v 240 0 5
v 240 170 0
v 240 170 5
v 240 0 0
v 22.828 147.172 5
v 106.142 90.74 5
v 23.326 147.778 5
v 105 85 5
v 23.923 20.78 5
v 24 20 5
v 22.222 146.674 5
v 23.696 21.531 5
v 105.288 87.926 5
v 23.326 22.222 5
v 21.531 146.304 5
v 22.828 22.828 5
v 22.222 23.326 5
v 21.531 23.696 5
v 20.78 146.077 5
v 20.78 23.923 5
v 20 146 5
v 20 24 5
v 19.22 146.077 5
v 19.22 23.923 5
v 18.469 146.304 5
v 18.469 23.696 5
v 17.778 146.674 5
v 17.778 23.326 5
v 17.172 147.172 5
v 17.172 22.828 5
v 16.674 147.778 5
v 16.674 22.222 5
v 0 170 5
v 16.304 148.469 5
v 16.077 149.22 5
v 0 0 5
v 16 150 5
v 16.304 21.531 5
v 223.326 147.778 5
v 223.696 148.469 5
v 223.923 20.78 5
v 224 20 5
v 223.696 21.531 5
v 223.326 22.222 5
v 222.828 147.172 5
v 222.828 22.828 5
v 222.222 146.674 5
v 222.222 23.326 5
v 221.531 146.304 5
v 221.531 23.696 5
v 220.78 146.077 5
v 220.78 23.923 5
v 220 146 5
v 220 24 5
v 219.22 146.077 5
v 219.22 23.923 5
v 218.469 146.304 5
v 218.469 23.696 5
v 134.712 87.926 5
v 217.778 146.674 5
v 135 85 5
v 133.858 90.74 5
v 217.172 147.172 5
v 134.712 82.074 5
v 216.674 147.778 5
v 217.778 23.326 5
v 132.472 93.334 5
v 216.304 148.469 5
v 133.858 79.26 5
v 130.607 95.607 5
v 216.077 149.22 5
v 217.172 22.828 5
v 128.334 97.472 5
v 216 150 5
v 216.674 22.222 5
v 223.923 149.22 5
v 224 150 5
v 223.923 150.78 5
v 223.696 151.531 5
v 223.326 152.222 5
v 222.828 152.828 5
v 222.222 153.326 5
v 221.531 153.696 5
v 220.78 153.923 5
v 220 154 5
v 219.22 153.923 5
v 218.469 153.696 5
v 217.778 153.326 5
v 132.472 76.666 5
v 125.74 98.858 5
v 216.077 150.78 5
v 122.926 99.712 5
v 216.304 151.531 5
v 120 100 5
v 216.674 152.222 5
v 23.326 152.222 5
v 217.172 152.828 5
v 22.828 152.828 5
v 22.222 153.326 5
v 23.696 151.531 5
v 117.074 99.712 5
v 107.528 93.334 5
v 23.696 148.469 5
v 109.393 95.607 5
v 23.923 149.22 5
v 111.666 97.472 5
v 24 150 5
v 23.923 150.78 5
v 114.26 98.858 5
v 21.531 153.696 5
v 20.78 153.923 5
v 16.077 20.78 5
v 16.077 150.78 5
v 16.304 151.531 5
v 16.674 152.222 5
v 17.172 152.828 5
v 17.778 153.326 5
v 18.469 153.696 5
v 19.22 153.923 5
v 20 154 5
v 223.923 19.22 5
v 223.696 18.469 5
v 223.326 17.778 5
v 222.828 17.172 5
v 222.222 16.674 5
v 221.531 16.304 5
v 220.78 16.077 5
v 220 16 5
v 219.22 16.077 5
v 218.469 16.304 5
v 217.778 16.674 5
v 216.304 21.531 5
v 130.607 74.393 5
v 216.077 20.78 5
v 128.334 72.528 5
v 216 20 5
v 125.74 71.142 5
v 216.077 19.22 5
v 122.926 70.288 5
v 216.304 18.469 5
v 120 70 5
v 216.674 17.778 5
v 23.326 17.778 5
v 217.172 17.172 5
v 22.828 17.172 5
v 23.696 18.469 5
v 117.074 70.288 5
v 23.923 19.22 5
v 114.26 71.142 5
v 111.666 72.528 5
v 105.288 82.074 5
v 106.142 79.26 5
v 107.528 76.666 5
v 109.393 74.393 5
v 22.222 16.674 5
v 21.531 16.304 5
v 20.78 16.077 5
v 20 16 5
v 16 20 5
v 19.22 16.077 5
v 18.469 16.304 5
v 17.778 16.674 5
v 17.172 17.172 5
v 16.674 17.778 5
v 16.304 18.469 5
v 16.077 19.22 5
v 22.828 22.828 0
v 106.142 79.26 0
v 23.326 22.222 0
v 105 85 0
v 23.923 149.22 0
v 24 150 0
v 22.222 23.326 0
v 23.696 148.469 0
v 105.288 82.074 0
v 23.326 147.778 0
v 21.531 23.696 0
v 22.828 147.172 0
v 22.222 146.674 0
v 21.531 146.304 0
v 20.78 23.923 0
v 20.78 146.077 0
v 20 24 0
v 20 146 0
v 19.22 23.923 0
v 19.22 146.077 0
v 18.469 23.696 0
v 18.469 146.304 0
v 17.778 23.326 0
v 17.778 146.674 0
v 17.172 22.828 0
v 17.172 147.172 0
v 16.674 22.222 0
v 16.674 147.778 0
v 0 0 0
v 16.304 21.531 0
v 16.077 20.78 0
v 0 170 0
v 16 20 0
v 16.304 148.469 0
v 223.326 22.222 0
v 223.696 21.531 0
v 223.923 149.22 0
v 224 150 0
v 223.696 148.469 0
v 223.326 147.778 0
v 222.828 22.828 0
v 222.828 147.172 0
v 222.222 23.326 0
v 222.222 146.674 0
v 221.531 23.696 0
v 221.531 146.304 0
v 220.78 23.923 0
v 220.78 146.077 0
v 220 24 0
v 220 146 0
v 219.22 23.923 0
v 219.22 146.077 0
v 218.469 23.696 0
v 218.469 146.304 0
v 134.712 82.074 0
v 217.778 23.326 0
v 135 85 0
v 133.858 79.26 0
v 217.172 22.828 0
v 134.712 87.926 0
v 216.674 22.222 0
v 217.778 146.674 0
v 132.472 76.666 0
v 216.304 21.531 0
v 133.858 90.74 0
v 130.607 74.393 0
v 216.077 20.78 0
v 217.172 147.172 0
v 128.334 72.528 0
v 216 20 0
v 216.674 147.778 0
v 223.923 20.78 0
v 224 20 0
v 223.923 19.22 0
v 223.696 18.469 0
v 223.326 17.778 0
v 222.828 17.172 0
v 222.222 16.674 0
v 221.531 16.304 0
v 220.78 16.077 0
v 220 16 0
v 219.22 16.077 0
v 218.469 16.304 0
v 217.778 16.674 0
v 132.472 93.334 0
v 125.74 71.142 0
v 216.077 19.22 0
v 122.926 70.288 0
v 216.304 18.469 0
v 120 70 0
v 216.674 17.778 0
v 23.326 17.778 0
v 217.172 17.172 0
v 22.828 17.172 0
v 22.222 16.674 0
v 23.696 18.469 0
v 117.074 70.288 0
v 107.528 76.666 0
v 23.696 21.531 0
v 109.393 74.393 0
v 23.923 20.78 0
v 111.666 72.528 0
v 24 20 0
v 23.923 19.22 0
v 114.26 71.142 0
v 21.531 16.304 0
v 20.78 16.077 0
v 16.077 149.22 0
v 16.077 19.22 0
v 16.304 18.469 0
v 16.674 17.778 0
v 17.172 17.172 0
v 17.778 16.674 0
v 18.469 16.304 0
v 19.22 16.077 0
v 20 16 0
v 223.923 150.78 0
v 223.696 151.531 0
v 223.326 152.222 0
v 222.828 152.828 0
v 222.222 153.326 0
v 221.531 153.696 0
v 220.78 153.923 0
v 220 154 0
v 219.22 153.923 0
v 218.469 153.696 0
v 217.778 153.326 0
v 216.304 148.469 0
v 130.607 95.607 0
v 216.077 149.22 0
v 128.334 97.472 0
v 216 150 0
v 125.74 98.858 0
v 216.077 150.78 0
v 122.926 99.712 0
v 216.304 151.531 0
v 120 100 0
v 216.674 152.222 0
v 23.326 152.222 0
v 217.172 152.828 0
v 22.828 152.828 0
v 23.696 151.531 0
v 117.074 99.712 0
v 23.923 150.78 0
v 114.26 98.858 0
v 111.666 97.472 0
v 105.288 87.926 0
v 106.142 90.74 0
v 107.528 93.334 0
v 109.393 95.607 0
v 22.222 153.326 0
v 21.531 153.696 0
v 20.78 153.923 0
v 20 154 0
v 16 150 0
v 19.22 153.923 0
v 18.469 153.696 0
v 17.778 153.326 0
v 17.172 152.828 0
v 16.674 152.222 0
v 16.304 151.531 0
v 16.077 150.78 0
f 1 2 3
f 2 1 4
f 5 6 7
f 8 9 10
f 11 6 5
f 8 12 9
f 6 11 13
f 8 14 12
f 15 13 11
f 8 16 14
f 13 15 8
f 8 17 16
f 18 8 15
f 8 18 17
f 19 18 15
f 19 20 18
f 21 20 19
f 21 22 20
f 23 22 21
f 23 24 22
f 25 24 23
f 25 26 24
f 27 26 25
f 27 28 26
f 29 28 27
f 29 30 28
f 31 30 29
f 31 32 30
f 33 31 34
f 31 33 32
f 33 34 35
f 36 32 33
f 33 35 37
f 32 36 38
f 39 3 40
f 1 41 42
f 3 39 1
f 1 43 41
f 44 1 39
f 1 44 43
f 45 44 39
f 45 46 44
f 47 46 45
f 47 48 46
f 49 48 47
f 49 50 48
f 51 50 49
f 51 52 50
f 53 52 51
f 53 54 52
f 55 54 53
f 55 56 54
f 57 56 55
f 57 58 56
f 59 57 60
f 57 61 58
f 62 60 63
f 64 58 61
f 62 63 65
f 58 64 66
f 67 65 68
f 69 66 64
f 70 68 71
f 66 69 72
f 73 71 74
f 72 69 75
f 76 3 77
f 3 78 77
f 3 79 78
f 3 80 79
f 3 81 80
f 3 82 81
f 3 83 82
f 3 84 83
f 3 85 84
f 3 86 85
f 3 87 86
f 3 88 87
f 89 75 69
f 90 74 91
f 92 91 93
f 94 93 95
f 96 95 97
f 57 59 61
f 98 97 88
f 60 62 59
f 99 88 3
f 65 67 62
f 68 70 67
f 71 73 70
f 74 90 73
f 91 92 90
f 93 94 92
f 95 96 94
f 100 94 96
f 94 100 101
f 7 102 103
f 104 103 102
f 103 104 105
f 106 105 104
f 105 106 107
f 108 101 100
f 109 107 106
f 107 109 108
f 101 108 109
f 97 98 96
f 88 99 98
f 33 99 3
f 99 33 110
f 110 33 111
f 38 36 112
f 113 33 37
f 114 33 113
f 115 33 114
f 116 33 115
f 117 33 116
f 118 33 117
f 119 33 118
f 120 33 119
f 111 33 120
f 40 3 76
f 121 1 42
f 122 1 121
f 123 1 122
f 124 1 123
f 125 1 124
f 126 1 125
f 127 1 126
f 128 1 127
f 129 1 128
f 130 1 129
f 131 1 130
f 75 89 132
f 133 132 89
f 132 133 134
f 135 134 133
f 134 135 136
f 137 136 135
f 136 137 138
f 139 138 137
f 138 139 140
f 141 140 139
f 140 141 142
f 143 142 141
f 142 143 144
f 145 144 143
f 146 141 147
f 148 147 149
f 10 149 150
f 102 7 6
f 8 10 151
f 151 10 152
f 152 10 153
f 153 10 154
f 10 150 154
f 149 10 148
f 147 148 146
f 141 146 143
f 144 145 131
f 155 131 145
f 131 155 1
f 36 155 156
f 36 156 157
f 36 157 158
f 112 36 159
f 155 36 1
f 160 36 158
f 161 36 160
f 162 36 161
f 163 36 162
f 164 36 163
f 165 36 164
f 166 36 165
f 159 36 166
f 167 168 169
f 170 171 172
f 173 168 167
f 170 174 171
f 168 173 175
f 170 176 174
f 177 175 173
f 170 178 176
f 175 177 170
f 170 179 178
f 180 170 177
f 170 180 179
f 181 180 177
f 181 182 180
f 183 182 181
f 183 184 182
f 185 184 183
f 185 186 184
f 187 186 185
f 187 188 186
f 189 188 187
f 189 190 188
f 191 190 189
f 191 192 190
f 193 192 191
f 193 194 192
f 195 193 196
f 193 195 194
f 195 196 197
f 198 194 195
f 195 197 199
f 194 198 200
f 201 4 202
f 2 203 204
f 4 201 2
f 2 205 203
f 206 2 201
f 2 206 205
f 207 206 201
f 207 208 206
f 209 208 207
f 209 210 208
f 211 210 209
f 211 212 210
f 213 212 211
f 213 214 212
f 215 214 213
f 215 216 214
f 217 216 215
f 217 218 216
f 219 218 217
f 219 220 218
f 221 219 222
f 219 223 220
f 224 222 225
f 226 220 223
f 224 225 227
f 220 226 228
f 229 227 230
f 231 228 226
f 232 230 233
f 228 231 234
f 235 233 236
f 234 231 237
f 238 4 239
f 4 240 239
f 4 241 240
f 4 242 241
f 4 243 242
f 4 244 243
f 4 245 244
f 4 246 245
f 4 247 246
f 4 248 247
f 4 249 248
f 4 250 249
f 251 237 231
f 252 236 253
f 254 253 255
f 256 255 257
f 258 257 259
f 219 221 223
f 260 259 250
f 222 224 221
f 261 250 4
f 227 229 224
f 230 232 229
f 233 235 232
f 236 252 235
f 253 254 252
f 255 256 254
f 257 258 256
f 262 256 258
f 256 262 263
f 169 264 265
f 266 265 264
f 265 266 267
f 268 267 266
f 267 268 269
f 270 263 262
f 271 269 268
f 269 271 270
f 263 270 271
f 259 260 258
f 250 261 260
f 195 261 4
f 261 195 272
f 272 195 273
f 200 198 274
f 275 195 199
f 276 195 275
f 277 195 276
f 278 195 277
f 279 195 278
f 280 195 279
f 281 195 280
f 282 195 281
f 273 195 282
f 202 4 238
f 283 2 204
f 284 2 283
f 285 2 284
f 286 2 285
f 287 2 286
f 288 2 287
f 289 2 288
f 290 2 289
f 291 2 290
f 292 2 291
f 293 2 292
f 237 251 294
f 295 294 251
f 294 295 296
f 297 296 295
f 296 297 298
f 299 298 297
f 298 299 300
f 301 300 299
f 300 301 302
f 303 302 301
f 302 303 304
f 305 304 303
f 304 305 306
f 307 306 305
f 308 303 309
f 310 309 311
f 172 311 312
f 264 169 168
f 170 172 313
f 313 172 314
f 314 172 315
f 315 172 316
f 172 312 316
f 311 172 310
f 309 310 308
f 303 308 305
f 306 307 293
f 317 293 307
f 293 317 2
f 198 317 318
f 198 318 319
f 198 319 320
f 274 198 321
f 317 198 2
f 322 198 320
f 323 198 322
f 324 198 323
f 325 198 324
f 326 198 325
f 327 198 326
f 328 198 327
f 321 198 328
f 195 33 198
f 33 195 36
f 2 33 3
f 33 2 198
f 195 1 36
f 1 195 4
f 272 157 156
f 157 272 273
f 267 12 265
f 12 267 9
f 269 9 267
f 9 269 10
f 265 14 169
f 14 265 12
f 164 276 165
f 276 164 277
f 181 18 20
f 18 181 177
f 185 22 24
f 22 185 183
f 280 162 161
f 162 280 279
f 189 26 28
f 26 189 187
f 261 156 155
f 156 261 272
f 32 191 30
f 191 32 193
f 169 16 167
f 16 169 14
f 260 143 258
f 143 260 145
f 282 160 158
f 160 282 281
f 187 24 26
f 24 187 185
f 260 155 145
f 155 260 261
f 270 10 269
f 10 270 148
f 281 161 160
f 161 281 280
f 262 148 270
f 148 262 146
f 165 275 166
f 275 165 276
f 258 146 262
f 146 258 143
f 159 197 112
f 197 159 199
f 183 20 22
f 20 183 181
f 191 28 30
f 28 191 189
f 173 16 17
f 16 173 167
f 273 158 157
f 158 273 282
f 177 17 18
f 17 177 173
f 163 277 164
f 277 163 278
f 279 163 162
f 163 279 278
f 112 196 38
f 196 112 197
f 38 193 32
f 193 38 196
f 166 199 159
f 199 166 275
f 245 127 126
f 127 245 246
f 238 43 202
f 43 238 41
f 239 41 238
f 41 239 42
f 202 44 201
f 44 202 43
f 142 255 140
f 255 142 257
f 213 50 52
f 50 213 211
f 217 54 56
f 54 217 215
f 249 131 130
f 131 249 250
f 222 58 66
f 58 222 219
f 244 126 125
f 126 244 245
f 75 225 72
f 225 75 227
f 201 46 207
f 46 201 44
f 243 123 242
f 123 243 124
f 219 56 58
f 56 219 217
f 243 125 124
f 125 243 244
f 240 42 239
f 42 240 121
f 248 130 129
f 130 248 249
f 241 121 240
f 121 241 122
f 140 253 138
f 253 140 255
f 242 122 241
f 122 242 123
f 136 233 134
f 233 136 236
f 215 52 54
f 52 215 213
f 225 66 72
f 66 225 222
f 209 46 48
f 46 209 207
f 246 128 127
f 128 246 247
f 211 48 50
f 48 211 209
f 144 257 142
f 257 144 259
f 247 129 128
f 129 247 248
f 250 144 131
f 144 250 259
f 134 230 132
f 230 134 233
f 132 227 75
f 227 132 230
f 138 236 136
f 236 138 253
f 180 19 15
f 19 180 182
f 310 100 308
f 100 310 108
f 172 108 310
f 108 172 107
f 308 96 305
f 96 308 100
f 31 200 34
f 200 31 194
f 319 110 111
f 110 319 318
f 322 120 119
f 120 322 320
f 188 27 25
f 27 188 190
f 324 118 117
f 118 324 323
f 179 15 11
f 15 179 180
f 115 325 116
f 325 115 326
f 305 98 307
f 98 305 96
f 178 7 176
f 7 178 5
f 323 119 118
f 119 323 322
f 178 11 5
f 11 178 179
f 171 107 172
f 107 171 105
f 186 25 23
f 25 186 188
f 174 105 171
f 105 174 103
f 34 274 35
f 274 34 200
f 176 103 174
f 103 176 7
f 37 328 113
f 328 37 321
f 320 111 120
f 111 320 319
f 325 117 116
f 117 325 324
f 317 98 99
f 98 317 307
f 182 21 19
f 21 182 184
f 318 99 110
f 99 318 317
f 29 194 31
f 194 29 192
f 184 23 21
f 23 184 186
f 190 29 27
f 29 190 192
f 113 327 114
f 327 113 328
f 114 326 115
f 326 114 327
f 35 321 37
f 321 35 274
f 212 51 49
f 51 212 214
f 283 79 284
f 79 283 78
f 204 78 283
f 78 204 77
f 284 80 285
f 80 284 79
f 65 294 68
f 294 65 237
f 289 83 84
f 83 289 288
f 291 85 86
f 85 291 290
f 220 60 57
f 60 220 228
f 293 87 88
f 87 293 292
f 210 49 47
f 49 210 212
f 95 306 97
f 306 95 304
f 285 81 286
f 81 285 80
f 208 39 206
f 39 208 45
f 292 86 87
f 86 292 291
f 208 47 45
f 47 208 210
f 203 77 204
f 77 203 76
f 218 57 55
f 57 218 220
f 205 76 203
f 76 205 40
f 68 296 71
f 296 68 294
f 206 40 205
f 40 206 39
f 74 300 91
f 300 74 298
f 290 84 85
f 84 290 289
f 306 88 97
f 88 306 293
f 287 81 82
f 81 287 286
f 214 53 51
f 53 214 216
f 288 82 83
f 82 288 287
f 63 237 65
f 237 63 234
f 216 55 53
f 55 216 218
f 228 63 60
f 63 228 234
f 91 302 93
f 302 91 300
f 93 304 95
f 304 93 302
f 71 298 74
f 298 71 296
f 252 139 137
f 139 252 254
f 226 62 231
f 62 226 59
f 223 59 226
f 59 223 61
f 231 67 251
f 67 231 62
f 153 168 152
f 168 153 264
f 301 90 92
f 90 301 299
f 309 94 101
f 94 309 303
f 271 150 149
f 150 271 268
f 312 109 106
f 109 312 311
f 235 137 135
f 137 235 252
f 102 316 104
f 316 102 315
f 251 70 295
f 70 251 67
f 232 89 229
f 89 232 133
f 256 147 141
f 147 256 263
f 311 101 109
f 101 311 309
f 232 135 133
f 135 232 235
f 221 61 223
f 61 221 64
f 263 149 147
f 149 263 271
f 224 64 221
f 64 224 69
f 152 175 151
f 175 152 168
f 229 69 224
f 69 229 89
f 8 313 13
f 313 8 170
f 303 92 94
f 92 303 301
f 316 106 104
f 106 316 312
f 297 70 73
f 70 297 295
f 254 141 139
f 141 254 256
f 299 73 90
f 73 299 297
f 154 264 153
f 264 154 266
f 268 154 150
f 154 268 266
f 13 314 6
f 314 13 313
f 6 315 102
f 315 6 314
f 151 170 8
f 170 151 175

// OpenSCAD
$fn = 32;

// ----------------------------------------------------------------------
// Big plate: 200-250 mm adapter plate
// ----------------------------------------------------------------------

// --- parameters (mm) ---
plate_l = 240;            // plate length, X
plate_w = 170;            // plate width, Y
plate_t = 5;              // plate thickness, Z
corner_d = 8;             // corner hole diameter
corner_in = 20;           // corner hole inset from the edges
bore_d = 30;              // central bore
fit_tol = 0.1;            // tolerance for press fits, mm
free_tol = 0.5;           // tolerance for clearance fits, mm

difference() {
  cube([plate_l, plate_w, plate_t]);
  translate([corner_in, corner_in, -1]) cylinder(h = plate_t + 2, d = corner_d);
  translate([plate_l - corner_in, corner_in, -1]) cylinder(h = plate_t + 2, d = corner_d);
  translate([corner_in, plate_w - corner_in, -1]) cylinder(h = plate_t + 2, d = corner_d);
  translate([plate_l - corner_in, plate_w - corner_in, -1]) cylinder(h = plate_t + 2, d = corner_d);
  translate([plate_l / 2, plate_w / 2, -1]) cylinder(h = plate_t + 2, d = bore_d);
}
